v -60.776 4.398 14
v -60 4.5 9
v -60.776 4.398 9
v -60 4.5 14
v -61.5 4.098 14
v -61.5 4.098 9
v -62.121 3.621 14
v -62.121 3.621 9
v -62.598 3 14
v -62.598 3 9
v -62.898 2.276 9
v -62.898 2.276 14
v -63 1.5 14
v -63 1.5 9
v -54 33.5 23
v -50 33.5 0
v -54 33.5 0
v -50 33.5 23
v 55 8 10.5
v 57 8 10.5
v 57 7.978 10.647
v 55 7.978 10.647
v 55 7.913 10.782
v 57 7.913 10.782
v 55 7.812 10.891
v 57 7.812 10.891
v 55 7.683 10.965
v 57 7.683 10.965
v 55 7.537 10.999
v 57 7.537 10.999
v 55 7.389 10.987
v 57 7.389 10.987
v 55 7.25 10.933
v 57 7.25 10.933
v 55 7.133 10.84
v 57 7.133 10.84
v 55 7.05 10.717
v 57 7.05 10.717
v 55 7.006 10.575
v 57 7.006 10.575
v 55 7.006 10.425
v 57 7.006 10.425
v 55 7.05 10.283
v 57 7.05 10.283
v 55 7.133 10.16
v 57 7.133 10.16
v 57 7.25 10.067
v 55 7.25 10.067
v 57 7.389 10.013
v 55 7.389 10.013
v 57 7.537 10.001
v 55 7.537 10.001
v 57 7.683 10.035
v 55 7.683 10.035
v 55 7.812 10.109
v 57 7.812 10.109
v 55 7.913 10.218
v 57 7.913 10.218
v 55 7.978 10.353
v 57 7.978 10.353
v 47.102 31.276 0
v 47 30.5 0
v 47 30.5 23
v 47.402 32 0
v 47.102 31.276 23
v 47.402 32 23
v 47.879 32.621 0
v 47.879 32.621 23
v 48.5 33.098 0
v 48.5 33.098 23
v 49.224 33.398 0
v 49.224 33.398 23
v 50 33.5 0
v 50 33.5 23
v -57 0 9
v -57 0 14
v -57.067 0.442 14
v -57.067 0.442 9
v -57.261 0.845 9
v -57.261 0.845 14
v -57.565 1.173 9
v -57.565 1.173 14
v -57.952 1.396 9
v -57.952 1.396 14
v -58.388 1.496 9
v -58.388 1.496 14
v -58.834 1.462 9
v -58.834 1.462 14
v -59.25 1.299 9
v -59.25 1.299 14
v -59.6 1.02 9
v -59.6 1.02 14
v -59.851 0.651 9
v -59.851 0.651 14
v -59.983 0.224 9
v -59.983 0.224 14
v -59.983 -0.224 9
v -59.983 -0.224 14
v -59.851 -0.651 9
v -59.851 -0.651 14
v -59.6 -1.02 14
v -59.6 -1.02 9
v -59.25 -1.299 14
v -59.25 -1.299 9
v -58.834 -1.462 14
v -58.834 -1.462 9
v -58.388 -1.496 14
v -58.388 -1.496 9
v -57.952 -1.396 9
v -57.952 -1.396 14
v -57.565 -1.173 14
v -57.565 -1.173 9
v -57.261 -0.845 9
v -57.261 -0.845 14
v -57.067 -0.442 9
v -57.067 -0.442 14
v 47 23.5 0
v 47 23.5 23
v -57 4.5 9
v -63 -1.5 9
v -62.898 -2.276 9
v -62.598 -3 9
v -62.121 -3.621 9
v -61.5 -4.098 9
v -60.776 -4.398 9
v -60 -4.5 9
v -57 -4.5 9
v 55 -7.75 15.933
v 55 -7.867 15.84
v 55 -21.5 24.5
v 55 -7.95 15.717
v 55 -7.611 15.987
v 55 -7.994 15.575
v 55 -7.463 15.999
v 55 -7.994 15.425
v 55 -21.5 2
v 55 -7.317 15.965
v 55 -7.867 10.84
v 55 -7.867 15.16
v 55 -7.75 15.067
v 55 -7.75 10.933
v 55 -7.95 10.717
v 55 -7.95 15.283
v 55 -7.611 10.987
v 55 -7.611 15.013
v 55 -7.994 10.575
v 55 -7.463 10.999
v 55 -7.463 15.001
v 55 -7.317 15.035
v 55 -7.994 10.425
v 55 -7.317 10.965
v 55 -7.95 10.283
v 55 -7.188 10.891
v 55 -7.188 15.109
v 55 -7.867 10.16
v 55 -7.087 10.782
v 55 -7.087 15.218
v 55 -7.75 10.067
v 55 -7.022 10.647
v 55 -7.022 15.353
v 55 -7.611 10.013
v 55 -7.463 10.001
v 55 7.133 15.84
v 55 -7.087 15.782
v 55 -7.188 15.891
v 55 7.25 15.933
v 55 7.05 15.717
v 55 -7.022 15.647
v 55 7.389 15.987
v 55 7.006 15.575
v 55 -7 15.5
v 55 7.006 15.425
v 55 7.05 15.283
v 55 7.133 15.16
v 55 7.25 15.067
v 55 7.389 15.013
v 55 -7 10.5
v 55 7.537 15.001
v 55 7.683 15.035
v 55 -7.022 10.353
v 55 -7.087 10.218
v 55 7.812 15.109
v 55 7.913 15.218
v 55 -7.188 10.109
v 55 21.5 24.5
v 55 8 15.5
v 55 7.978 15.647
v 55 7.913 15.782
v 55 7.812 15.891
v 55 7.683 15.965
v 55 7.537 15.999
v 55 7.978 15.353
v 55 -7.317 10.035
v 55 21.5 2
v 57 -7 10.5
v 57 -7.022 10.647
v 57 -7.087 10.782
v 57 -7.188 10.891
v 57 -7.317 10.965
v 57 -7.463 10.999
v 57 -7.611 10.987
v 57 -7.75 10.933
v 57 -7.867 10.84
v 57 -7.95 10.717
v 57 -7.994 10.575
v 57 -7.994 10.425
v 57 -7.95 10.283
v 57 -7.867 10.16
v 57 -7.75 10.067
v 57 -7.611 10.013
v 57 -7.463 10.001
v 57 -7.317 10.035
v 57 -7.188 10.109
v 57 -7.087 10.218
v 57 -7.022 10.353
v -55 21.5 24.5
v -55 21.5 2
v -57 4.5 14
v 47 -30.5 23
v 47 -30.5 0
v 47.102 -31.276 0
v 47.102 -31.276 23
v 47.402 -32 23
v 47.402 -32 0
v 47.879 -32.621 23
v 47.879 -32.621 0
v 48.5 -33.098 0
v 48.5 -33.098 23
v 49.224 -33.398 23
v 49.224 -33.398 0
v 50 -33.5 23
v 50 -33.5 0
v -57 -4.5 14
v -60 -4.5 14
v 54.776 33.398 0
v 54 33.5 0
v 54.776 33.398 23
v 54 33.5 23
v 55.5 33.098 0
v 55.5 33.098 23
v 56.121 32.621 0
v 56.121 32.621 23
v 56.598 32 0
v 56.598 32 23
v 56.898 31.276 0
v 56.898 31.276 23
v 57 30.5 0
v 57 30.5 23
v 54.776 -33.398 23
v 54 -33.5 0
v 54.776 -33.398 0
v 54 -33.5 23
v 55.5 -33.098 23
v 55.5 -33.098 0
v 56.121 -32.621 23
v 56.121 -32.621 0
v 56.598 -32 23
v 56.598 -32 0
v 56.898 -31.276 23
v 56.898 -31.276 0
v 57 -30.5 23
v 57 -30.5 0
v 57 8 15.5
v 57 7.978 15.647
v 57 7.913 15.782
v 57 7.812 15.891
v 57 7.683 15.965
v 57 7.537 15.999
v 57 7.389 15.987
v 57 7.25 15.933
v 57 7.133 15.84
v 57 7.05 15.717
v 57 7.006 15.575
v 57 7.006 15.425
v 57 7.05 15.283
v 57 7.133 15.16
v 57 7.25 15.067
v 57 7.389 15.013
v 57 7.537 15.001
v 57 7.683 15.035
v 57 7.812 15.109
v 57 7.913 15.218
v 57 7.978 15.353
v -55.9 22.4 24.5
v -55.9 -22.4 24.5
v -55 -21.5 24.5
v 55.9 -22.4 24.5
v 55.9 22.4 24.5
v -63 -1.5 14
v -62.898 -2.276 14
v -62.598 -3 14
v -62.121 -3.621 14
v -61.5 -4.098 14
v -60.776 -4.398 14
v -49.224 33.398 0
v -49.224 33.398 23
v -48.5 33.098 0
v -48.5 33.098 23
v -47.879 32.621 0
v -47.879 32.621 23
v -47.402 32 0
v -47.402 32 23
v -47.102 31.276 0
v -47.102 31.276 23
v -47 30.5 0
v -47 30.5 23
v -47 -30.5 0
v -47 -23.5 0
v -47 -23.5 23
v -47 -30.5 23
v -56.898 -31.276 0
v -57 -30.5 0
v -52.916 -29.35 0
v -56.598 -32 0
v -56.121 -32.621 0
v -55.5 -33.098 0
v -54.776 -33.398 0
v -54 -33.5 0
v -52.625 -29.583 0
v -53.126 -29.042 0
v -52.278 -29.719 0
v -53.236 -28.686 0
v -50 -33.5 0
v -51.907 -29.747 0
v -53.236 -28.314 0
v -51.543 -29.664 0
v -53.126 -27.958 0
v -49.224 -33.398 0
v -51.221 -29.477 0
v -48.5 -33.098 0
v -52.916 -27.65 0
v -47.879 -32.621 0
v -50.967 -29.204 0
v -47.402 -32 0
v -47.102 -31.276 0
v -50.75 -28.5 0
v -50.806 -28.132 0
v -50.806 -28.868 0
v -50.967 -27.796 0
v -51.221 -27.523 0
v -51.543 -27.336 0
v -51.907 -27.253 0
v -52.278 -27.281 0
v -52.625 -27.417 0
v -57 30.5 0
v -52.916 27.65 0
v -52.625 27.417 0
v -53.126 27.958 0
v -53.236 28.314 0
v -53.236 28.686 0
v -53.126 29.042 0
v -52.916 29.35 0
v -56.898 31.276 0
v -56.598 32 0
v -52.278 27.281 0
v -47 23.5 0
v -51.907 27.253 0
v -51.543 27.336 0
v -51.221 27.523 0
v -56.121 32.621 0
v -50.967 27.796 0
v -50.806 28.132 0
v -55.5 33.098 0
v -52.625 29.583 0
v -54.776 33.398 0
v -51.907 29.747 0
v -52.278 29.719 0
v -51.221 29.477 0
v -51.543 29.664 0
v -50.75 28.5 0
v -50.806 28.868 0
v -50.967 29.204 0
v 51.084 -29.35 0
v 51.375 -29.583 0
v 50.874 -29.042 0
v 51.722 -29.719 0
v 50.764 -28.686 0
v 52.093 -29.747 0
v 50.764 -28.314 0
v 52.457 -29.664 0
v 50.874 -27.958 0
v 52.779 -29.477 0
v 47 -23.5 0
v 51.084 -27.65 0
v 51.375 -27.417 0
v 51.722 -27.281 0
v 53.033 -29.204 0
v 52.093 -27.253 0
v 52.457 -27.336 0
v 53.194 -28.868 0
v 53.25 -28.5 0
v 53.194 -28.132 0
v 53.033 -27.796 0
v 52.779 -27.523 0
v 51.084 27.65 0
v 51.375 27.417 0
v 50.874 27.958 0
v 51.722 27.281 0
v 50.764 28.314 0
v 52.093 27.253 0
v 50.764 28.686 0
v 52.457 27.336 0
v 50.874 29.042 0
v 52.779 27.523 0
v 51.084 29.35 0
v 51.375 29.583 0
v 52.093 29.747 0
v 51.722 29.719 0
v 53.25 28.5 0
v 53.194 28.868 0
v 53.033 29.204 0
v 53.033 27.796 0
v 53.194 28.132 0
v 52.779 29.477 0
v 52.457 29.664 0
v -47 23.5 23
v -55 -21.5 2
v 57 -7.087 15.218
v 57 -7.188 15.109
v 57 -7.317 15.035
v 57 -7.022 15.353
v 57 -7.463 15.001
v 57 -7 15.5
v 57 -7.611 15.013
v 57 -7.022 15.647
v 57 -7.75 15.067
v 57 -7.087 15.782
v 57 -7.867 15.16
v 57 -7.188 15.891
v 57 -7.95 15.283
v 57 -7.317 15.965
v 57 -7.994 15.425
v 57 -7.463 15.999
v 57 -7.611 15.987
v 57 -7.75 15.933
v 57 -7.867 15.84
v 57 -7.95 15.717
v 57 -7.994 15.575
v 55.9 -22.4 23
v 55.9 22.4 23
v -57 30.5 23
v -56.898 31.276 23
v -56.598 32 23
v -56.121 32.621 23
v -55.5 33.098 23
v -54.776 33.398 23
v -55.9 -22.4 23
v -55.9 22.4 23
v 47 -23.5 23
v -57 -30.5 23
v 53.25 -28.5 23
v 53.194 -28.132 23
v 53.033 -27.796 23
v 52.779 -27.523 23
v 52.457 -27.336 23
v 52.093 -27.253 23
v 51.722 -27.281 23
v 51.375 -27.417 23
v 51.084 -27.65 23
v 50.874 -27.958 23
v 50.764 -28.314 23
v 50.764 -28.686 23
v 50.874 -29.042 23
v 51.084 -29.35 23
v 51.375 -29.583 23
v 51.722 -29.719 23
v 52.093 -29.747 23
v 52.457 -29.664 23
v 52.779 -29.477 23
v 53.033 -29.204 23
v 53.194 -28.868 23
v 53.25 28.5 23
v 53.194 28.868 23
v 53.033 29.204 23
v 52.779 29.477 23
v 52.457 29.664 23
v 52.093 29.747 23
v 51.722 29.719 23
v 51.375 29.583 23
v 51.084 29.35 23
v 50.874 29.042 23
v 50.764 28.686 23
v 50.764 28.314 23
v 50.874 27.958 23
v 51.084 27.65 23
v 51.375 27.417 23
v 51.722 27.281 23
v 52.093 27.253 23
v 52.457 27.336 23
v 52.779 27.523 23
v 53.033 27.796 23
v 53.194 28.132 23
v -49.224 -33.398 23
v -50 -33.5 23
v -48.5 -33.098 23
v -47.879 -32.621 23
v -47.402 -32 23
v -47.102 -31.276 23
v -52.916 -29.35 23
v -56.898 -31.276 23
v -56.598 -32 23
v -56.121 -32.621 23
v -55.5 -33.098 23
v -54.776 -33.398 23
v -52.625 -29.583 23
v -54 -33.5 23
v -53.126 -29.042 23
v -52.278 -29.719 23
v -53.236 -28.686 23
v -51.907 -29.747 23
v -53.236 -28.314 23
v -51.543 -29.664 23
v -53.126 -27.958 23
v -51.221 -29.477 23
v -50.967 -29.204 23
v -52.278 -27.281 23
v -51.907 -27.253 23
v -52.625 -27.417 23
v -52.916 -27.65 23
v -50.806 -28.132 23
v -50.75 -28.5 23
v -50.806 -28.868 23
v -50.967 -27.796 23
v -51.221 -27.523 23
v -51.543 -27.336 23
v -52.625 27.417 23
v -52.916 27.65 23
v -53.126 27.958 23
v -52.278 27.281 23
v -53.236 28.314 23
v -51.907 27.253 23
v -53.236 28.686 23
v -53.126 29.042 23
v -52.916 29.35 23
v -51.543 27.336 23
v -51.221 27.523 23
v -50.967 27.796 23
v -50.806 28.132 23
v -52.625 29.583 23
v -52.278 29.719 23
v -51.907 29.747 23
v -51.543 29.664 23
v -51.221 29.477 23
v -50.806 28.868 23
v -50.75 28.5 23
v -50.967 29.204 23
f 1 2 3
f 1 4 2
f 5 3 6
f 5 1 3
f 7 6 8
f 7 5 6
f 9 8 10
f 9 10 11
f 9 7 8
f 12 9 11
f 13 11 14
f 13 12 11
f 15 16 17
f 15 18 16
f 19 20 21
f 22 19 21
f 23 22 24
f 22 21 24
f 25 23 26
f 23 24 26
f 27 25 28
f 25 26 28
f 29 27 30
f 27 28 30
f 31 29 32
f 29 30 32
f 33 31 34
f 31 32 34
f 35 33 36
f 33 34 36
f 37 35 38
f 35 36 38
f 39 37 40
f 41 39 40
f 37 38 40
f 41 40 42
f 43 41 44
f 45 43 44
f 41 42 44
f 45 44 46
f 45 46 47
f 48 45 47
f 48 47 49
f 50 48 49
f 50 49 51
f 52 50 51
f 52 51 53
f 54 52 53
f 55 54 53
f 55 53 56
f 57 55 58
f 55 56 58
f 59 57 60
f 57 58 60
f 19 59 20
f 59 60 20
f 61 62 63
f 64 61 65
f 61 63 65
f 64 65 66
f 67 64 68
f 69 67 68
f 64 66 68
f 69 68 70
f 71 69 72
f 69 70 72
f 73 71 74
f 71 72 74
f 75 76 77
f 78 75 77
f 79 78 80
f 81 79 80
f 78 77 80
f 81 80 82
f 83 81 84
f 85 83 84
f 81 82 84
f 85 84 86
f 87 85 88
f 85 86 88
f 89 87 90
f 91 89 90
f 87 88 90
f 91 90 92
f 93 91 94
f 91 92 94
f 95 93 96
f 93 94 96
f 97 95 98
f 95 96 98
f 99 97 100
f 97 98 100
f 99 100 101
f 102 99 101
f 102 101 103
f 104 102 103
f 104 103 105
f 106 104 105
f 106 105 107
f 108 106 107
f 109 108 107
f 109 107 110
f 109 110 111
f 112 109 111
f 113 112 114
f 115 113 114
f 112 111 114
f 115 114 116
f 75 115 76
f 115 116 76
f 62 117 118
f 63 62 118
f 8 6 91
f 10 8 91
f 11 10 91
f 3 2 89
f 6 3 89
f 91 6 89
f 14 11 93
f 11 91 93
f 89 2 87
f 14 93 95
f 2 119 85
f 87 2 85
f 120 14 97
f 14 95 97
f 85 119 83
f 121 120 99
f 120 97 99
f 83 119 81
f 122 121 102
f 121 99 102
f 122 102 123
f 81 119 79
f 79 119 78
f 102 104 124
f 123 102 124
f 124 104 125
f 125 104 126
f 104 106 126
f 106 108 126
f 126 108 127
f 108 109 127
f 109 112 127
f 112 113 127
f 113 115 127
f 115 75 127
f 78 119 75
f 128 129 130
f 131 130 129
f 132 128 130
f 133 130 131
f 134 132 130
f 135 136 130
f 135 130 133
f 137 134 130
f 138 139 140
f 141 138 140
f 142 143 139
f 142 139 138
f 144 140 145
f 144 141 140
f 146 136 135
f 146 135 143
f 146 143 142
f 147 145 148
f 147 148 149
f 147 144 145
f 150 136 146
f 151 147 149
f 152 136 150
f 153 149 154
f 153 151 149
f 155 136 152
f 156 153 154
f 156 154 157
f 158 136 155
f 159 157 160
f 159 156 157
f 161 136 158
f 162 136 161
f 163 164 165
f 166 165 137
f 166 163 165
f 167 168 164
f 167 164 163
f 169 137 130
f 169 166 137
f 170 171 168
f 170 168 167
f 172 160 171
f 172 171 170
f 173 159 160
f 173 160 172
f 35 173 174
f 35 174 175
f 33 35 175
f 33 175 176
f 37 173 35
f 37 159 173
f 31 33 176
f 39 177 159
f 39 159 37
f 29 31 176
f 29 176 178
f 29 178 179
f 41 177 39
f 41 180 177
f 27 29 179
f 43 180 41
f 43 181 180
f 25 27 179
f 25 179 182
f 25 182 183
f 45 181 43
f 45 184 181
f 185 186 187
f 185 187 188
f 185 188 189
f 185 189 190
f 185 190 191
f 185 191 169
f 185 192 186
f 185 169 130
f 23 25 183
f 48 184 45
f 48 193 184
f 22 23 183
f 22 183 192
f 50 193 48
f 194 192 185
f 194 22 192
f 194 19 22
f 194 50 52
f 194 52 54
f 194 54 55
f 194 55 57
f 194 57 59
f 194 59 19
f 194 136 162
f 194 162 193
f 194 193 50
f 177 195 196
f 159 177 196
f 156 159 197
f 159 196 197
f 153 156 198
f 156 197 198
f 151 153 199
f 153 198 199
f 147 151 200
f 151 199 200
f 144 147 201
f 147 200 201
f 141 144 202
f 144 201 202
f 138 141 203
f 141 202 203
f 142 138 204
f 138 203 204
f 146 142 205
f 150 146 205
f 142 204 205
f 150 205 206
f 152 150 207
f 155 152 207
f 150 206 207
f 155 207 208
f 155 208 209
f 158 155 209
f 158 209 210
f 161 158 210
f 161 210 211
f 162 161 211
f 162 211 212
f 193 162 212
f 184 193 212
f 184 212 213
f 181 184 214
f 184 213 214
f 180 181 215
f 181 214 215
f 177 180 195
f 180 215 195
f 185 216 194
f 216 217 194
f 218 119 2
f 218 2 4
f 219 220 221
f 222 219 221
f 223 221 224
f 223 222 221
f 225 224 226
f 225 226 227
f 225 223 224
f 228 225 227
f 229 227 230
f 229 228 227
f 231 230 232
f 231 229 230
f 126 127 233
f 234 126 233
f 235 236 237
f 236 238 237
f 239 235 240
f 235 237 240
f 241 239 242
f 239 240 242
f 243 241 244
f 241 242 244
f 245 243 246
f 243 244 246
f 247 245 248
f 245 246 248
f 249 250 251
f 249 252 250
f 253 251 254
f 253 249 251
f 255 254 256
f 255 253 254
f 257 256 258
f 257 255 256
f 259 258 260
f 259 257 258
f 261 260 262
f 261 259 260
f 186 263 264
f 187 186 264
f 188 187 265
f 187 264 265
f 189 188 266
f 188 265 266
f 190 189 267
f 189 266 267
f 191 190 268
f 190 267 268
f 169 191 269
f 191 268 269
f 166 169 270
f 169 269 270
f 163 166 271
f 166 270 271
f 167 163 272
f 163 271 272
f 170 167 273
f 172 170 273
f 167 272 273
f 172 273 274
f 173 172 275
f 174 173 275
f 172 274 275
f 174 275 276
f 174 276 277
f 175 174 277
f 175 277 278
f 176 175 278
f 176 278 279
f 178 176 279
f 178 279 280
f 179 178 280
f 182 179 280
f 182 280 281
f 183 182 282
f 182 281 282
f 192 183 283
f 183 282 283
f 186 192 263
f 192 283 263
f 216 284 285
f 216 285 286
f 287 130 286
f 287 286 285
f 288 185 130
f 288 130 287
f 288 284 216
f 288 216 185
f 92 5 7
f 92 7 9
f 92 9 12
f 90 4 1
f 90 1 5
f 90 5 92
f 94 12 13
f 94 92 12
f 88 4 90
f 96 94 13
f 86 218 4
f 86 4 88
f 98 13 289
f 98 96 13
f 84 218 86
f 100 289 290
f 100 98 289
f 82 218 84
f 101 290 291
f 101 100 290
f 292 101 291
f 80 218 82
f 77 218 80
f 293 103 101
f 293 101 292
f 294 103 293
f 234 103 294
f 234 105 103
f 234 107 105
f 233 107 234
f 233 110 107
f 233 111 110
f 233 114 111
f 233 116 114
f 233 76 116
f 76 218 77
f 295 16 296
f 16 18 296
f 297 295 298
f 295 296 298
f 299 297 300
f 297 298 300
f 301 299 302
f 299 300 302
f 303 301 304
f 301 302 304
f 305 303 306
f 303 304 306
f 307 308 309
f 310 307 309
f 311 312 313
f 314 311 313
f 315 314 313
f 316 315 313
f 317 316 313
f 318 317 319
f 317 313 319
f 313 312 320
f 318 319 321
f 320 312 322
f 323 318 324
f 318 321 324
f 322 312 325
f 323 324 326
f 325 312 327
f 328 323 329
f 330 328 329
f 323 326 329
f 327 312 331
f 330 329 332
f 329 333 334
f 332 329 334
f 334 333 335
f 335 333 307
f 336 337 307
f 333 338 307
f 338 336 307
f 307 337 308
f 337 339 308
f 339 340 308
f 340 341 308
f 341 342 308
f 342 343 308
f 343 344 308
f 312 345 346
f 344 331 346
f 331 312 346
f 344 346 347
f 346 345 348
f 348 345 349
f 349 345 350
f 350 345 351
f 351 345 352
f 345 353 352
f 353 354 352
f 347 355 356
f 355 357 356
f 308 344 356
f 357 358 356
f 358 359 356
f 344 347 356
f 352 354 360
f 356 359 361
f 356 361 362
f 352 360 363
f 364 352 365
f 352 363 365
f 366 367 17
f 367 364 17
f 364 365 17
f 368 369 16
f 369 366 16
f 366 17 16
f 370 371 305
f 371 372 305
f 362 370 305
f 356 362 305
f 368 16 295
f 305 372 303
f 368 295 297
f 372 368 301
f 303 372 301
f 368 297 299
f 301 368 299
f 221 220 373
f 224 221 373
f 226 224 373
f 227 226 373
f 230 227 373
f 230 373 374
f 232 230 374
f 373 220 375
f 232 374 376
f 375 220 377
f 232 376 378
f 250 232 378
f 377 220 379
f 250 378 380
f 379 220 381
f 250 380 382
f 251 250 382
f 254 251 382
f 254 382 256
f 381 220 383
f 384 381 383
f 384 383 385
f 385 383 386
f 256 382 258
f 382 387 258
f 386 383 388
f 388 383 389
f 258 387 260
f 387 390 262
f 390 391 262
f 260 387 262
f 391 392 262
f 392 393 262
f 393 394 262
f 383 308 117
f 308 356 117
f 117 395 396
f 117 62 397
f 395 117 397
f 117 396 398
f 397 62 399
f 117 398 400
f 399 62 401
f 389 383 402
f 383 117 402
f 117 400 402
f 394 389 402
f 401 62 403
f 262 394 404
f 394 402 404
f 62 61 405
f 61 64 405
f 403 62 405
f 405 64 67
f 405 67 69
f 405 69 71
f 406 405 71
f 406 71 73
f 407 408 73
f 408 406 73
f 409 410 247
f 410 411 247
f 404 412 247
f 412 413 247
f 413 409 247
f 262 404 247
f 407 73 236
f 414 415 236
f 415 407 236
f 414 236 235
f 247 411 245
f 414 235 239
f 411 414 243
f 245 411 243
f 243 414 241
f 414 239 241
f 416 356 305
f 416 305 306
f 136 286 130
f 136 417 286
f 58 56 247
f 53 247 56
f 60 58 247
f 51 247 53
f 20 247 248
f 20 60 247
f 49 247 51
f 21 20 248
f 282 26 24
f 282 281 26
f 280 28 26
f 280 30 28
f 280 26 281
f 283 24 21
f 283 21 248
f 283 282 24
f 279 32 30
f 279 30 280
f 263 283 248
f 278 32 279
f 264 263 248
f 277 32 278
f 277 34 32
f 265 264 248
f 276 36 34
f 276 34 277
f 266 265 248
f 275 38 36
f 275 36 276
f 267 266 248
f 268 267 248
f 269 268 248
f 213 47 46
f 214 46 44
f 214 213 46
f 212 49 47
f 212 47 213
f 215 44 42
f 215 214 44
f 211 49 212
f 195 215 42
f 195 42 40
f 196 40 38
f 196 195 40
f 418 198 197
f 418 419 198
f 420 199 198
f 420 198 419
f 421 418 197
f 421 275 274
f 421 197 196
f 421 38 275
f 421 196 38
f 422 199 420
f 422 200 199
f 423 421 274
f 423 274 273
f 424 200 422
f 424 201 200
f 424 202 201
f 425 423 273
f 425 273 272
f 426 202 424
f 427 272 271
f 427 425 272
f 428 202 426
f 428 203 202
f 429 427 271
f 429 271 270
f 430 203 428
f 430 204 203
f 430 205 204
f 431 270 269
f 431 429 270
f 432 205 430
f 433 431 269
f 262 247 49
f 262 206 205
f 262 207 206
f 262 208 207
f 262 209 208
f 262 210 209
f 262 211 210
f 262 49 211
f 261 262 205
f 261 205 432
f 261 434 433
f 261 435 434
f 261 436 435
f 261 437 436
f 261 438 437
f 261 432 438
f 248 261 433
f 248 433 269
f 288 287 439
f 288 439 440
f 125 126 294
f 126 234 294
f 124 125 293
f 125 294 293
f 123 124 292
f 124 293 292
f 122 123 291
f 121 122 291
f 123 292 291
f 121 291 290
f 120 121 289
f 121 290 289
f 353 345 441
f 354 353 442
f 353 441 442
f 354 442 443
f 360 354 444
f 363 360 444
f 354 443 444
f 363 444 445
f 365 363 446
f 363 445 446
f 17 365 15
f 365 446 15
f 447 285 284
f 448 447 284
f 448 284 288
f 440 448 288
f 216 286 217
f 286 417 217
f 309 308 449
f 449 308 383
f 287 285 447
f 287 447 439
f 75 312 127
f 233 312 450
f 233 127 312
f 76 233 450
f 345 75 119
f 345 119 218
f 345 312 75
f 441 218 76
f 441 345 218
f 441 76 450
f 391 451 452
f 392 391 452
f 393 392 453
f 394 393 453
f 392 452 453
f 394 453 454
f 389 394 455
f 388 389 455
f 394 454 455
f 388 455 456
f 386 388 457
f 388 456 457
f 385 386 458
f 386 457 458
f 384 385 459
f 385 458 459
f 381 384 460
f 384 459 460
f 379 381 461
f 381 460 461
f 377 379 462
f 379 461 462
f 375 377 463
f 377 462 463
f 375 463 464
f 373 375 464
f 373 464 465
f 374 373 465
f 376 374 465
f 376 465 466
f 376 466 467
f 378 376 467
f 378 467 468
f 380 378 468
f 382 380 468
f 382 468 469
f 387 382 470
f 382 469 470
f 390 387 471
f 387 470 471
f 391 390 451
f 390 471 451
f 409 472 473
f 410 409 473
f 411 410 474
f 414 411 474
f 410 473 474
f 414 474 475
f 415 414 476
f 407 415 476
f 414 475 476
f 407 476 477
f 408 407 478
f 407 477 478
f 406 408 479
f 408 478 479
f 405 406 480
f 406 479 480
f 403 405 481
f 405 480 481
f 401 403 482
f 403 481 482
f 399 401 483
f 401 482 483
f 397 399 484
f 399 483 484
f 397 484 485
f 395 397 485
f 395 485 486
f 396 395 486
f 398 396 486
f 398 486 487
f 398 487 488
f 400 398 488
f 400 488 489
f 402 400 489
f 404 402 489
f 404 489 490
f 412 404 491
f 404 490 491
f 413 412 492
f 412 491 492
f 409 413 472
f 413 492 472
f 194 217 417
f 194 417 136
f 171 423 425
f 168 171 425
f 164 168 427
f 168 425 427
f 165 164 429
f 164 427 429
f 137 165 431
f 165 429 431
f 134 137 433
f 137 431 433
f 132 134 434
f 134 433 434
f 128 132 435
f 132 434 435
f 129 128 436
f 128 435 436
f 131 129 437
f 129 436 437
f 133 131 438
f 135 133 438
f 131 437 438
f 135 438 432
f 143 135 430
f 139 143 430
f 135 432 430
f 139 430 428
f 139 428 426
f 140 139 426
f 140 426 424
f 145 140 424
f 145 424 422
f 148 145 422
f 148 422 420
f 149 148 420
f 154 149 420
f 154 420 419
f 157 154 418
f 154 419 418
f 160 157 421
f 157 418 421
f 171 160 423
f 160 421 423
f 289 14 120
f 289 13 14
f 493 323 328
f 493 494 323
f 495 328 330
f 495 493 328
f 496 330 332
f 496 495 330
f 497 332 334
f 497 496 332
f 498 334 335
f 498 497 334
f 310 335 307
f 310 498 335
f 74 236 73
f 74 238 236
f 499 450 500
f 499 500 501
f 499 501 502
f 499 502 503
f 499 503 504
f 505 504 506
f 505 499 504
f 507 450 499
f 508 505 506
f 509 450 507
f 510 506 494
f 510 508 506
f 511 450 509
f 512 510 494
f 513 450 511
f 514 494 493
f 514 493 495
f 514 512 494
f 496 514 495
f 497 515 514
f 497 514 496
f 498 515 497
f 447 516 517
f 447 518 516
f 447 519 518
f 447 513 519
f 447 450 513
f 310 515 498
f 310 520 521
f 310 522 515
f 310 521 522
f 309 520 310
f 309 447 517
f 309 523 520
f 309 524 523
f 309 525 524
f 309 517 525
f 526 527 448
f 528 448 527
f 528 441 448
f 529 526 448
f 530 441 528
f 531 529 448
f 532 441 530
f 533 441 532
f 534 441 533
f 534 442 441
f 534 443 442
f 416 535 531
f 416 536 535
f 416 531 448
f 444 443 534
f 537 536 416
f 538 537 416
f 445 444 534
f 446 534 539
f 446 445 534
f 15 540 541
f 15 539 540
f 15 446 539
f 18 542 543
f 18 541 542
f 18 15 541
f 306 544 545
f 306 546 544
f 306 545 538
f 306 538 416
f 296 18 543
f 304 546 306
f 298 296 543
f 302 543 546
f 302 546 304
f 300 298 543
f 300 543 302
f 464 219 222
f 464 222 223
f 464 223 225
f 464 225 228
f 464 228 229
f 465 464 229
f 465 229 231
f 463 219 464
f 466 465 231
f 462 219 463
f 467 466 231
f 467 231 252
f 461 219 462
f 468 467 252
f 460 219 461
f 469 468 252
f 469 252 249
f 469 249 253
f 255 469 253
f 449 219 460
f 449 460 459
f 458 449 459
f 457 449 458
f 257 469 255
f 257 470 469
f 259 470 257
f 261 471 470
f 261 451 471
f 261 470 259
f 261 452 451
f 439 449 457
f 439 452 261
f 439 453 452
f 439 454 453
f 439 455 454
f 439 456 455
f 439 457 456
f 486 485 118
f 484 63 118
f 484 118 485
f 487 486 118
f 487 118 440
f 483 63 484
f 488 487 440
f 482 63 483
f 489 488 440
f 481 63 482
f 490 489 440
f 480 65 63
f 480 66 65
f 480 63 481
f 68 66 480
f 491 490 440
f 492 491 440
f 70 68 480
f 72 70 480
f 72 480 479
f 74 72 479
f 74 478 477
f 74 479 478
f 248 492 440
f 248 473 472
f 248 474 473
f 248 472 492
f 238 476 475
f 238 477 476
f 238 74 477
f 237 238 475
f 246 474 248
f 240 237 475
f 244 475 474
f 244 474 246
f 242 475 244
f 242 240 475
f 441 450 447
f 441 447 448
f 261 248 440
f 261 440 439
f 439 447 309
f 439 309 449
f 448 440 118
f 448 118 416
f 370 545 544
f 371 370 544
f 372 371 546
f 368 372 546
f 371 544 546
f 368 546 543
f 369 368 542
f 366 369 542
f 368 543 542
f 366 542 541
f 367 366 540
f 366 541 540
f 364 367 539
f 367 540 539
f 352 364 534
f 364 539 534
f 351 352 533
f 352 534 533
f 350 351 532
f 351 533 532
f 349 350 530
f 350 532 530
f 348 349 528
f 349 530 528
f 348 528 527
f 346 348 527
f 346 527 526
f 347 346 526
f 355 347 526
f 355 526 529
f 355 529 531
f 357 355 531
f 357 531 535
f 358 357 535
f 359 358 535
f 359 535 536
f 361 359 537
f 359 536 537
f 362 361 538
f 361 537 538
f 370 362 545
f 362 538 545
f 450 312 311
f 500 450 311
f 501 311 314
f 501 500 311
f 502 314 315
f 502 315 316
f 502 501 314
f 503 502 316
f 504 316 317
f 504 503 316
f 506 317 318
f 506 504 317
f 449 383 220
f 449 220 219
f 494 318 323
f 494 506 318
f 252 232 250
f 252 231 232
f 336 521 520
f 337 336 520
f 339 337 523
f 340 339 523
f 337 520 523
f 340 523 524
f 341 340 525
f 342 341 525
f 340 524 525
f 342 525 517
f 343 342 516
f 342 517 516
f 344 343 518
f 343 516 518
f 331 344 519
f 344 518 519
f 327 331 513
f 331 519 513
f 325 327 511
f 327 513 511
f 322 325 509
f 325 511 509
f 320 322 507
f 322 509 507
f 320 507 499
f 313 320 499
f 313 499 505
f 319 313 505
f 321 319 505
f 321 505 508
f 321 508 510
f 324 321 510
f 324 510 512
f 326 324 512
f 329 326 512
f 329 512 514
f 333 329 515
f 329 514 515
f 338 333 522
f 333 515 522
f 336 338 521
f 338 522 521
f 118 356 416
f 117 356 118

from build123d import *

# Parameters (mm, degrees)
SKETCH_W        = 114
SKETCH_H        = 47
PAD_DEPTH       = 24.5
THICKNESS_T     = -2
SKETCH001_W     = 114
SKETCH001_H     = 1.1
POCKET_DEPTH    = 1.5
SKETCH002_W     = 1.1
SKETCH002_H     = 47
POCKET001_DEPTH = 1.5
SKETCH003_W     = 10
SKETCH003_H     = 23
PAD001_DEPTH    = 10
SKETCH004_W     = 10
SKETCH004_H     = 23
PAD002_DEPTH    = 10
SKETCH005_R     = 1.25
POCKET002_DEPTH = 23
SKETCH006_R     = 0.5
POCKET003_DEPTH = 2
SKETCH007_W     = 9
SKETCH007_H     = 5
PAD003_DEPTH    = 6
SKETCH009_R     = 1.5
POCKET004_DEPTH = 5
FILLET_R        = 3
FILLET001_R     = 3
FILLET002_R     = 3


with BuildPart() as part:
    # Sketch → Pad (new body)
    with BuildSketch(Plane.XY):
        Rectangle(SKETCH_W, SKETCH_H)
    extrude(amount=PAD_DEPTH)

    # Thickness
    thickness_openings = [part.faces().sort_by_distance(p)[0] for p in [
        (0, 0, 24.5),
    ]]
    offset(amount=THICKNESS_T, openings=thickness_openings)

    # Sketch001 (on Face6 of Thickness) → Pocket (cut)
    with BuildSketch(Plane.XY.offset(24.5)):
        with Locations((0, -22.95)):
            Rectangle(SKETCH001_W, SKETCH001_H)
        with Locations((0, 22.95)):
            Rectangle(SKETCH001_W, SKETCH001_H)
    extrude(amount=-POCKET_DEPTH, mode=Mode.SUBTRACT)

    # Sketch002 (on Face6 of Pocket) → Pocket001 (cut)
    with BuildSketch(Plane.XY.offset(24.5)):
        with Locations((56.45, 0)):
            Rectangle(SKETCH002_W, SKETCH002_H)
        with Locations((-56.45, 0)):
            Rectangle(SKETCH002_W, SKETCH002_H)
    extrude(amount=-POCKET001_DEPTH, mode=Mode.SUBTRACT)

    # Sketch003 (on Face4 of Pocket001) → Pad001 (join)
    with BuildSketch(Plane(origin=(0, 23.5, 0), x_dir=(-1, 0, 0), z_dir=(0, 1, 0))):
        with Locations((-52, 11.5)):
            Rectangle(SKETCH003_W, SKETCH003_H)
        with Locations((52, 11.5)):
            Rectangle(SKETCH003_W, SKETCH003_H)
    extrude(amount=PAD001_DEPTH)

    # Sketch004 (on Face1 of Pad001) → Pad002 (join)
    with BuildSketch(Plane.XZ.offset(23.5)):
        with Locations((-52, 11.5)):
            Rectangle(SKETCH004_W, SKETCH004_H)
        with Locations((52, 11.5)):
            Rectangle(SKETCH004_W, SKETCH004_H)
    extrude(amount=PAD002_DEPTH)

    # Sketch005 (on Face12 of Pad002) → Pocket002 (cut)
    with BuildSketch(Plane.XY.offset(23)):
        with Locations((-52, 28.5)):
            Circle(SKETCH005_R)
        with Locations((52, 28.5)):
            Circle(SKETCH005_R)
        with Locations((52, -28.5)):
            Circle(SKETCH005_R)
        with Locations((-52, -28.5)):
            Circle(SKETCH005_R)
    extrude(amount=-POCKET002_DEPTH, mode=Mode.SUBTRACT)

    # Sketch006 (on Face12 of Pocket002) → Pocket003 (cut)
    with BuildSketch(Plane.YZ.offset(57)):
        with Locations((7.5, 10.5)):
            Circle(SKETCH006_R)
        with Locations((7.5, 15.5)):
            Circle(SKETCH006_R)
        with Locations((-7.5, 10.5)):
            Circle(SKETCH006_R)
        with Locations((-7.5, 15.5)):
            Circle(SKETCH006_R)
    extrude(amount=-POCKET003_DEPTH, mode=Mode.SUBTRACT)

    # Sketch007 (on Face4 of Pocket003) → Pad003 (join)
    with BuildSketch(Plane(origin=(-57, 0, 0), x_dir=(0, -1, 0), z_dir=(-1, 0, 0))):
        with Locations((0, 11.5)):
            Rectangle(SKETCH007_W, SKETCH007_H)
    extrude(amount=PAD003_DEPTH)

    # Sketch009 (on Face22 of Pad003) → Pocket004 (cut)
    with BuildSketch(Plane.XY.offset(14)):
        with Locations((-58.5, 0)):
            Circle(SKETCH009_R)
    extrude(amount=-POCKET004_DEPTH, mode=Mode.SUBTRACT)

    # Fillet
    fillet_edges = [part.edges().sort_by_distance(p)[0] for p in [
        (-57, -33.5, 11.5),
        (-47, -33.5, 11.5),
        (47, -33.5, 11.5),
        (57, -33.5, 11.5),
    ]]
    fillet(fillet_edges, radius=FILLET_R)

    # Fillet001
    fillet001_edges = [part.edges().sort_by_distance(p)[0] for p in [
        (-63, -4.5, 11.5),
        (-63, 4.5, 11.5),
    ]]
    fillet(fillet001_edges, radius=FILLET001_R)

    # Fillet002
    fillet002_edges = [part.edges().sort_by_distance(p)[0] for p in [
        (57, 33.5, 11.5),
        (47, 33.5, 11.5),
        (-47, 33.5, 11.5),
        (-57, 33.5, 11.5),
    ]]
    fillet(fillet002_edges, radius=FILLET002_R)


solid = part.part
